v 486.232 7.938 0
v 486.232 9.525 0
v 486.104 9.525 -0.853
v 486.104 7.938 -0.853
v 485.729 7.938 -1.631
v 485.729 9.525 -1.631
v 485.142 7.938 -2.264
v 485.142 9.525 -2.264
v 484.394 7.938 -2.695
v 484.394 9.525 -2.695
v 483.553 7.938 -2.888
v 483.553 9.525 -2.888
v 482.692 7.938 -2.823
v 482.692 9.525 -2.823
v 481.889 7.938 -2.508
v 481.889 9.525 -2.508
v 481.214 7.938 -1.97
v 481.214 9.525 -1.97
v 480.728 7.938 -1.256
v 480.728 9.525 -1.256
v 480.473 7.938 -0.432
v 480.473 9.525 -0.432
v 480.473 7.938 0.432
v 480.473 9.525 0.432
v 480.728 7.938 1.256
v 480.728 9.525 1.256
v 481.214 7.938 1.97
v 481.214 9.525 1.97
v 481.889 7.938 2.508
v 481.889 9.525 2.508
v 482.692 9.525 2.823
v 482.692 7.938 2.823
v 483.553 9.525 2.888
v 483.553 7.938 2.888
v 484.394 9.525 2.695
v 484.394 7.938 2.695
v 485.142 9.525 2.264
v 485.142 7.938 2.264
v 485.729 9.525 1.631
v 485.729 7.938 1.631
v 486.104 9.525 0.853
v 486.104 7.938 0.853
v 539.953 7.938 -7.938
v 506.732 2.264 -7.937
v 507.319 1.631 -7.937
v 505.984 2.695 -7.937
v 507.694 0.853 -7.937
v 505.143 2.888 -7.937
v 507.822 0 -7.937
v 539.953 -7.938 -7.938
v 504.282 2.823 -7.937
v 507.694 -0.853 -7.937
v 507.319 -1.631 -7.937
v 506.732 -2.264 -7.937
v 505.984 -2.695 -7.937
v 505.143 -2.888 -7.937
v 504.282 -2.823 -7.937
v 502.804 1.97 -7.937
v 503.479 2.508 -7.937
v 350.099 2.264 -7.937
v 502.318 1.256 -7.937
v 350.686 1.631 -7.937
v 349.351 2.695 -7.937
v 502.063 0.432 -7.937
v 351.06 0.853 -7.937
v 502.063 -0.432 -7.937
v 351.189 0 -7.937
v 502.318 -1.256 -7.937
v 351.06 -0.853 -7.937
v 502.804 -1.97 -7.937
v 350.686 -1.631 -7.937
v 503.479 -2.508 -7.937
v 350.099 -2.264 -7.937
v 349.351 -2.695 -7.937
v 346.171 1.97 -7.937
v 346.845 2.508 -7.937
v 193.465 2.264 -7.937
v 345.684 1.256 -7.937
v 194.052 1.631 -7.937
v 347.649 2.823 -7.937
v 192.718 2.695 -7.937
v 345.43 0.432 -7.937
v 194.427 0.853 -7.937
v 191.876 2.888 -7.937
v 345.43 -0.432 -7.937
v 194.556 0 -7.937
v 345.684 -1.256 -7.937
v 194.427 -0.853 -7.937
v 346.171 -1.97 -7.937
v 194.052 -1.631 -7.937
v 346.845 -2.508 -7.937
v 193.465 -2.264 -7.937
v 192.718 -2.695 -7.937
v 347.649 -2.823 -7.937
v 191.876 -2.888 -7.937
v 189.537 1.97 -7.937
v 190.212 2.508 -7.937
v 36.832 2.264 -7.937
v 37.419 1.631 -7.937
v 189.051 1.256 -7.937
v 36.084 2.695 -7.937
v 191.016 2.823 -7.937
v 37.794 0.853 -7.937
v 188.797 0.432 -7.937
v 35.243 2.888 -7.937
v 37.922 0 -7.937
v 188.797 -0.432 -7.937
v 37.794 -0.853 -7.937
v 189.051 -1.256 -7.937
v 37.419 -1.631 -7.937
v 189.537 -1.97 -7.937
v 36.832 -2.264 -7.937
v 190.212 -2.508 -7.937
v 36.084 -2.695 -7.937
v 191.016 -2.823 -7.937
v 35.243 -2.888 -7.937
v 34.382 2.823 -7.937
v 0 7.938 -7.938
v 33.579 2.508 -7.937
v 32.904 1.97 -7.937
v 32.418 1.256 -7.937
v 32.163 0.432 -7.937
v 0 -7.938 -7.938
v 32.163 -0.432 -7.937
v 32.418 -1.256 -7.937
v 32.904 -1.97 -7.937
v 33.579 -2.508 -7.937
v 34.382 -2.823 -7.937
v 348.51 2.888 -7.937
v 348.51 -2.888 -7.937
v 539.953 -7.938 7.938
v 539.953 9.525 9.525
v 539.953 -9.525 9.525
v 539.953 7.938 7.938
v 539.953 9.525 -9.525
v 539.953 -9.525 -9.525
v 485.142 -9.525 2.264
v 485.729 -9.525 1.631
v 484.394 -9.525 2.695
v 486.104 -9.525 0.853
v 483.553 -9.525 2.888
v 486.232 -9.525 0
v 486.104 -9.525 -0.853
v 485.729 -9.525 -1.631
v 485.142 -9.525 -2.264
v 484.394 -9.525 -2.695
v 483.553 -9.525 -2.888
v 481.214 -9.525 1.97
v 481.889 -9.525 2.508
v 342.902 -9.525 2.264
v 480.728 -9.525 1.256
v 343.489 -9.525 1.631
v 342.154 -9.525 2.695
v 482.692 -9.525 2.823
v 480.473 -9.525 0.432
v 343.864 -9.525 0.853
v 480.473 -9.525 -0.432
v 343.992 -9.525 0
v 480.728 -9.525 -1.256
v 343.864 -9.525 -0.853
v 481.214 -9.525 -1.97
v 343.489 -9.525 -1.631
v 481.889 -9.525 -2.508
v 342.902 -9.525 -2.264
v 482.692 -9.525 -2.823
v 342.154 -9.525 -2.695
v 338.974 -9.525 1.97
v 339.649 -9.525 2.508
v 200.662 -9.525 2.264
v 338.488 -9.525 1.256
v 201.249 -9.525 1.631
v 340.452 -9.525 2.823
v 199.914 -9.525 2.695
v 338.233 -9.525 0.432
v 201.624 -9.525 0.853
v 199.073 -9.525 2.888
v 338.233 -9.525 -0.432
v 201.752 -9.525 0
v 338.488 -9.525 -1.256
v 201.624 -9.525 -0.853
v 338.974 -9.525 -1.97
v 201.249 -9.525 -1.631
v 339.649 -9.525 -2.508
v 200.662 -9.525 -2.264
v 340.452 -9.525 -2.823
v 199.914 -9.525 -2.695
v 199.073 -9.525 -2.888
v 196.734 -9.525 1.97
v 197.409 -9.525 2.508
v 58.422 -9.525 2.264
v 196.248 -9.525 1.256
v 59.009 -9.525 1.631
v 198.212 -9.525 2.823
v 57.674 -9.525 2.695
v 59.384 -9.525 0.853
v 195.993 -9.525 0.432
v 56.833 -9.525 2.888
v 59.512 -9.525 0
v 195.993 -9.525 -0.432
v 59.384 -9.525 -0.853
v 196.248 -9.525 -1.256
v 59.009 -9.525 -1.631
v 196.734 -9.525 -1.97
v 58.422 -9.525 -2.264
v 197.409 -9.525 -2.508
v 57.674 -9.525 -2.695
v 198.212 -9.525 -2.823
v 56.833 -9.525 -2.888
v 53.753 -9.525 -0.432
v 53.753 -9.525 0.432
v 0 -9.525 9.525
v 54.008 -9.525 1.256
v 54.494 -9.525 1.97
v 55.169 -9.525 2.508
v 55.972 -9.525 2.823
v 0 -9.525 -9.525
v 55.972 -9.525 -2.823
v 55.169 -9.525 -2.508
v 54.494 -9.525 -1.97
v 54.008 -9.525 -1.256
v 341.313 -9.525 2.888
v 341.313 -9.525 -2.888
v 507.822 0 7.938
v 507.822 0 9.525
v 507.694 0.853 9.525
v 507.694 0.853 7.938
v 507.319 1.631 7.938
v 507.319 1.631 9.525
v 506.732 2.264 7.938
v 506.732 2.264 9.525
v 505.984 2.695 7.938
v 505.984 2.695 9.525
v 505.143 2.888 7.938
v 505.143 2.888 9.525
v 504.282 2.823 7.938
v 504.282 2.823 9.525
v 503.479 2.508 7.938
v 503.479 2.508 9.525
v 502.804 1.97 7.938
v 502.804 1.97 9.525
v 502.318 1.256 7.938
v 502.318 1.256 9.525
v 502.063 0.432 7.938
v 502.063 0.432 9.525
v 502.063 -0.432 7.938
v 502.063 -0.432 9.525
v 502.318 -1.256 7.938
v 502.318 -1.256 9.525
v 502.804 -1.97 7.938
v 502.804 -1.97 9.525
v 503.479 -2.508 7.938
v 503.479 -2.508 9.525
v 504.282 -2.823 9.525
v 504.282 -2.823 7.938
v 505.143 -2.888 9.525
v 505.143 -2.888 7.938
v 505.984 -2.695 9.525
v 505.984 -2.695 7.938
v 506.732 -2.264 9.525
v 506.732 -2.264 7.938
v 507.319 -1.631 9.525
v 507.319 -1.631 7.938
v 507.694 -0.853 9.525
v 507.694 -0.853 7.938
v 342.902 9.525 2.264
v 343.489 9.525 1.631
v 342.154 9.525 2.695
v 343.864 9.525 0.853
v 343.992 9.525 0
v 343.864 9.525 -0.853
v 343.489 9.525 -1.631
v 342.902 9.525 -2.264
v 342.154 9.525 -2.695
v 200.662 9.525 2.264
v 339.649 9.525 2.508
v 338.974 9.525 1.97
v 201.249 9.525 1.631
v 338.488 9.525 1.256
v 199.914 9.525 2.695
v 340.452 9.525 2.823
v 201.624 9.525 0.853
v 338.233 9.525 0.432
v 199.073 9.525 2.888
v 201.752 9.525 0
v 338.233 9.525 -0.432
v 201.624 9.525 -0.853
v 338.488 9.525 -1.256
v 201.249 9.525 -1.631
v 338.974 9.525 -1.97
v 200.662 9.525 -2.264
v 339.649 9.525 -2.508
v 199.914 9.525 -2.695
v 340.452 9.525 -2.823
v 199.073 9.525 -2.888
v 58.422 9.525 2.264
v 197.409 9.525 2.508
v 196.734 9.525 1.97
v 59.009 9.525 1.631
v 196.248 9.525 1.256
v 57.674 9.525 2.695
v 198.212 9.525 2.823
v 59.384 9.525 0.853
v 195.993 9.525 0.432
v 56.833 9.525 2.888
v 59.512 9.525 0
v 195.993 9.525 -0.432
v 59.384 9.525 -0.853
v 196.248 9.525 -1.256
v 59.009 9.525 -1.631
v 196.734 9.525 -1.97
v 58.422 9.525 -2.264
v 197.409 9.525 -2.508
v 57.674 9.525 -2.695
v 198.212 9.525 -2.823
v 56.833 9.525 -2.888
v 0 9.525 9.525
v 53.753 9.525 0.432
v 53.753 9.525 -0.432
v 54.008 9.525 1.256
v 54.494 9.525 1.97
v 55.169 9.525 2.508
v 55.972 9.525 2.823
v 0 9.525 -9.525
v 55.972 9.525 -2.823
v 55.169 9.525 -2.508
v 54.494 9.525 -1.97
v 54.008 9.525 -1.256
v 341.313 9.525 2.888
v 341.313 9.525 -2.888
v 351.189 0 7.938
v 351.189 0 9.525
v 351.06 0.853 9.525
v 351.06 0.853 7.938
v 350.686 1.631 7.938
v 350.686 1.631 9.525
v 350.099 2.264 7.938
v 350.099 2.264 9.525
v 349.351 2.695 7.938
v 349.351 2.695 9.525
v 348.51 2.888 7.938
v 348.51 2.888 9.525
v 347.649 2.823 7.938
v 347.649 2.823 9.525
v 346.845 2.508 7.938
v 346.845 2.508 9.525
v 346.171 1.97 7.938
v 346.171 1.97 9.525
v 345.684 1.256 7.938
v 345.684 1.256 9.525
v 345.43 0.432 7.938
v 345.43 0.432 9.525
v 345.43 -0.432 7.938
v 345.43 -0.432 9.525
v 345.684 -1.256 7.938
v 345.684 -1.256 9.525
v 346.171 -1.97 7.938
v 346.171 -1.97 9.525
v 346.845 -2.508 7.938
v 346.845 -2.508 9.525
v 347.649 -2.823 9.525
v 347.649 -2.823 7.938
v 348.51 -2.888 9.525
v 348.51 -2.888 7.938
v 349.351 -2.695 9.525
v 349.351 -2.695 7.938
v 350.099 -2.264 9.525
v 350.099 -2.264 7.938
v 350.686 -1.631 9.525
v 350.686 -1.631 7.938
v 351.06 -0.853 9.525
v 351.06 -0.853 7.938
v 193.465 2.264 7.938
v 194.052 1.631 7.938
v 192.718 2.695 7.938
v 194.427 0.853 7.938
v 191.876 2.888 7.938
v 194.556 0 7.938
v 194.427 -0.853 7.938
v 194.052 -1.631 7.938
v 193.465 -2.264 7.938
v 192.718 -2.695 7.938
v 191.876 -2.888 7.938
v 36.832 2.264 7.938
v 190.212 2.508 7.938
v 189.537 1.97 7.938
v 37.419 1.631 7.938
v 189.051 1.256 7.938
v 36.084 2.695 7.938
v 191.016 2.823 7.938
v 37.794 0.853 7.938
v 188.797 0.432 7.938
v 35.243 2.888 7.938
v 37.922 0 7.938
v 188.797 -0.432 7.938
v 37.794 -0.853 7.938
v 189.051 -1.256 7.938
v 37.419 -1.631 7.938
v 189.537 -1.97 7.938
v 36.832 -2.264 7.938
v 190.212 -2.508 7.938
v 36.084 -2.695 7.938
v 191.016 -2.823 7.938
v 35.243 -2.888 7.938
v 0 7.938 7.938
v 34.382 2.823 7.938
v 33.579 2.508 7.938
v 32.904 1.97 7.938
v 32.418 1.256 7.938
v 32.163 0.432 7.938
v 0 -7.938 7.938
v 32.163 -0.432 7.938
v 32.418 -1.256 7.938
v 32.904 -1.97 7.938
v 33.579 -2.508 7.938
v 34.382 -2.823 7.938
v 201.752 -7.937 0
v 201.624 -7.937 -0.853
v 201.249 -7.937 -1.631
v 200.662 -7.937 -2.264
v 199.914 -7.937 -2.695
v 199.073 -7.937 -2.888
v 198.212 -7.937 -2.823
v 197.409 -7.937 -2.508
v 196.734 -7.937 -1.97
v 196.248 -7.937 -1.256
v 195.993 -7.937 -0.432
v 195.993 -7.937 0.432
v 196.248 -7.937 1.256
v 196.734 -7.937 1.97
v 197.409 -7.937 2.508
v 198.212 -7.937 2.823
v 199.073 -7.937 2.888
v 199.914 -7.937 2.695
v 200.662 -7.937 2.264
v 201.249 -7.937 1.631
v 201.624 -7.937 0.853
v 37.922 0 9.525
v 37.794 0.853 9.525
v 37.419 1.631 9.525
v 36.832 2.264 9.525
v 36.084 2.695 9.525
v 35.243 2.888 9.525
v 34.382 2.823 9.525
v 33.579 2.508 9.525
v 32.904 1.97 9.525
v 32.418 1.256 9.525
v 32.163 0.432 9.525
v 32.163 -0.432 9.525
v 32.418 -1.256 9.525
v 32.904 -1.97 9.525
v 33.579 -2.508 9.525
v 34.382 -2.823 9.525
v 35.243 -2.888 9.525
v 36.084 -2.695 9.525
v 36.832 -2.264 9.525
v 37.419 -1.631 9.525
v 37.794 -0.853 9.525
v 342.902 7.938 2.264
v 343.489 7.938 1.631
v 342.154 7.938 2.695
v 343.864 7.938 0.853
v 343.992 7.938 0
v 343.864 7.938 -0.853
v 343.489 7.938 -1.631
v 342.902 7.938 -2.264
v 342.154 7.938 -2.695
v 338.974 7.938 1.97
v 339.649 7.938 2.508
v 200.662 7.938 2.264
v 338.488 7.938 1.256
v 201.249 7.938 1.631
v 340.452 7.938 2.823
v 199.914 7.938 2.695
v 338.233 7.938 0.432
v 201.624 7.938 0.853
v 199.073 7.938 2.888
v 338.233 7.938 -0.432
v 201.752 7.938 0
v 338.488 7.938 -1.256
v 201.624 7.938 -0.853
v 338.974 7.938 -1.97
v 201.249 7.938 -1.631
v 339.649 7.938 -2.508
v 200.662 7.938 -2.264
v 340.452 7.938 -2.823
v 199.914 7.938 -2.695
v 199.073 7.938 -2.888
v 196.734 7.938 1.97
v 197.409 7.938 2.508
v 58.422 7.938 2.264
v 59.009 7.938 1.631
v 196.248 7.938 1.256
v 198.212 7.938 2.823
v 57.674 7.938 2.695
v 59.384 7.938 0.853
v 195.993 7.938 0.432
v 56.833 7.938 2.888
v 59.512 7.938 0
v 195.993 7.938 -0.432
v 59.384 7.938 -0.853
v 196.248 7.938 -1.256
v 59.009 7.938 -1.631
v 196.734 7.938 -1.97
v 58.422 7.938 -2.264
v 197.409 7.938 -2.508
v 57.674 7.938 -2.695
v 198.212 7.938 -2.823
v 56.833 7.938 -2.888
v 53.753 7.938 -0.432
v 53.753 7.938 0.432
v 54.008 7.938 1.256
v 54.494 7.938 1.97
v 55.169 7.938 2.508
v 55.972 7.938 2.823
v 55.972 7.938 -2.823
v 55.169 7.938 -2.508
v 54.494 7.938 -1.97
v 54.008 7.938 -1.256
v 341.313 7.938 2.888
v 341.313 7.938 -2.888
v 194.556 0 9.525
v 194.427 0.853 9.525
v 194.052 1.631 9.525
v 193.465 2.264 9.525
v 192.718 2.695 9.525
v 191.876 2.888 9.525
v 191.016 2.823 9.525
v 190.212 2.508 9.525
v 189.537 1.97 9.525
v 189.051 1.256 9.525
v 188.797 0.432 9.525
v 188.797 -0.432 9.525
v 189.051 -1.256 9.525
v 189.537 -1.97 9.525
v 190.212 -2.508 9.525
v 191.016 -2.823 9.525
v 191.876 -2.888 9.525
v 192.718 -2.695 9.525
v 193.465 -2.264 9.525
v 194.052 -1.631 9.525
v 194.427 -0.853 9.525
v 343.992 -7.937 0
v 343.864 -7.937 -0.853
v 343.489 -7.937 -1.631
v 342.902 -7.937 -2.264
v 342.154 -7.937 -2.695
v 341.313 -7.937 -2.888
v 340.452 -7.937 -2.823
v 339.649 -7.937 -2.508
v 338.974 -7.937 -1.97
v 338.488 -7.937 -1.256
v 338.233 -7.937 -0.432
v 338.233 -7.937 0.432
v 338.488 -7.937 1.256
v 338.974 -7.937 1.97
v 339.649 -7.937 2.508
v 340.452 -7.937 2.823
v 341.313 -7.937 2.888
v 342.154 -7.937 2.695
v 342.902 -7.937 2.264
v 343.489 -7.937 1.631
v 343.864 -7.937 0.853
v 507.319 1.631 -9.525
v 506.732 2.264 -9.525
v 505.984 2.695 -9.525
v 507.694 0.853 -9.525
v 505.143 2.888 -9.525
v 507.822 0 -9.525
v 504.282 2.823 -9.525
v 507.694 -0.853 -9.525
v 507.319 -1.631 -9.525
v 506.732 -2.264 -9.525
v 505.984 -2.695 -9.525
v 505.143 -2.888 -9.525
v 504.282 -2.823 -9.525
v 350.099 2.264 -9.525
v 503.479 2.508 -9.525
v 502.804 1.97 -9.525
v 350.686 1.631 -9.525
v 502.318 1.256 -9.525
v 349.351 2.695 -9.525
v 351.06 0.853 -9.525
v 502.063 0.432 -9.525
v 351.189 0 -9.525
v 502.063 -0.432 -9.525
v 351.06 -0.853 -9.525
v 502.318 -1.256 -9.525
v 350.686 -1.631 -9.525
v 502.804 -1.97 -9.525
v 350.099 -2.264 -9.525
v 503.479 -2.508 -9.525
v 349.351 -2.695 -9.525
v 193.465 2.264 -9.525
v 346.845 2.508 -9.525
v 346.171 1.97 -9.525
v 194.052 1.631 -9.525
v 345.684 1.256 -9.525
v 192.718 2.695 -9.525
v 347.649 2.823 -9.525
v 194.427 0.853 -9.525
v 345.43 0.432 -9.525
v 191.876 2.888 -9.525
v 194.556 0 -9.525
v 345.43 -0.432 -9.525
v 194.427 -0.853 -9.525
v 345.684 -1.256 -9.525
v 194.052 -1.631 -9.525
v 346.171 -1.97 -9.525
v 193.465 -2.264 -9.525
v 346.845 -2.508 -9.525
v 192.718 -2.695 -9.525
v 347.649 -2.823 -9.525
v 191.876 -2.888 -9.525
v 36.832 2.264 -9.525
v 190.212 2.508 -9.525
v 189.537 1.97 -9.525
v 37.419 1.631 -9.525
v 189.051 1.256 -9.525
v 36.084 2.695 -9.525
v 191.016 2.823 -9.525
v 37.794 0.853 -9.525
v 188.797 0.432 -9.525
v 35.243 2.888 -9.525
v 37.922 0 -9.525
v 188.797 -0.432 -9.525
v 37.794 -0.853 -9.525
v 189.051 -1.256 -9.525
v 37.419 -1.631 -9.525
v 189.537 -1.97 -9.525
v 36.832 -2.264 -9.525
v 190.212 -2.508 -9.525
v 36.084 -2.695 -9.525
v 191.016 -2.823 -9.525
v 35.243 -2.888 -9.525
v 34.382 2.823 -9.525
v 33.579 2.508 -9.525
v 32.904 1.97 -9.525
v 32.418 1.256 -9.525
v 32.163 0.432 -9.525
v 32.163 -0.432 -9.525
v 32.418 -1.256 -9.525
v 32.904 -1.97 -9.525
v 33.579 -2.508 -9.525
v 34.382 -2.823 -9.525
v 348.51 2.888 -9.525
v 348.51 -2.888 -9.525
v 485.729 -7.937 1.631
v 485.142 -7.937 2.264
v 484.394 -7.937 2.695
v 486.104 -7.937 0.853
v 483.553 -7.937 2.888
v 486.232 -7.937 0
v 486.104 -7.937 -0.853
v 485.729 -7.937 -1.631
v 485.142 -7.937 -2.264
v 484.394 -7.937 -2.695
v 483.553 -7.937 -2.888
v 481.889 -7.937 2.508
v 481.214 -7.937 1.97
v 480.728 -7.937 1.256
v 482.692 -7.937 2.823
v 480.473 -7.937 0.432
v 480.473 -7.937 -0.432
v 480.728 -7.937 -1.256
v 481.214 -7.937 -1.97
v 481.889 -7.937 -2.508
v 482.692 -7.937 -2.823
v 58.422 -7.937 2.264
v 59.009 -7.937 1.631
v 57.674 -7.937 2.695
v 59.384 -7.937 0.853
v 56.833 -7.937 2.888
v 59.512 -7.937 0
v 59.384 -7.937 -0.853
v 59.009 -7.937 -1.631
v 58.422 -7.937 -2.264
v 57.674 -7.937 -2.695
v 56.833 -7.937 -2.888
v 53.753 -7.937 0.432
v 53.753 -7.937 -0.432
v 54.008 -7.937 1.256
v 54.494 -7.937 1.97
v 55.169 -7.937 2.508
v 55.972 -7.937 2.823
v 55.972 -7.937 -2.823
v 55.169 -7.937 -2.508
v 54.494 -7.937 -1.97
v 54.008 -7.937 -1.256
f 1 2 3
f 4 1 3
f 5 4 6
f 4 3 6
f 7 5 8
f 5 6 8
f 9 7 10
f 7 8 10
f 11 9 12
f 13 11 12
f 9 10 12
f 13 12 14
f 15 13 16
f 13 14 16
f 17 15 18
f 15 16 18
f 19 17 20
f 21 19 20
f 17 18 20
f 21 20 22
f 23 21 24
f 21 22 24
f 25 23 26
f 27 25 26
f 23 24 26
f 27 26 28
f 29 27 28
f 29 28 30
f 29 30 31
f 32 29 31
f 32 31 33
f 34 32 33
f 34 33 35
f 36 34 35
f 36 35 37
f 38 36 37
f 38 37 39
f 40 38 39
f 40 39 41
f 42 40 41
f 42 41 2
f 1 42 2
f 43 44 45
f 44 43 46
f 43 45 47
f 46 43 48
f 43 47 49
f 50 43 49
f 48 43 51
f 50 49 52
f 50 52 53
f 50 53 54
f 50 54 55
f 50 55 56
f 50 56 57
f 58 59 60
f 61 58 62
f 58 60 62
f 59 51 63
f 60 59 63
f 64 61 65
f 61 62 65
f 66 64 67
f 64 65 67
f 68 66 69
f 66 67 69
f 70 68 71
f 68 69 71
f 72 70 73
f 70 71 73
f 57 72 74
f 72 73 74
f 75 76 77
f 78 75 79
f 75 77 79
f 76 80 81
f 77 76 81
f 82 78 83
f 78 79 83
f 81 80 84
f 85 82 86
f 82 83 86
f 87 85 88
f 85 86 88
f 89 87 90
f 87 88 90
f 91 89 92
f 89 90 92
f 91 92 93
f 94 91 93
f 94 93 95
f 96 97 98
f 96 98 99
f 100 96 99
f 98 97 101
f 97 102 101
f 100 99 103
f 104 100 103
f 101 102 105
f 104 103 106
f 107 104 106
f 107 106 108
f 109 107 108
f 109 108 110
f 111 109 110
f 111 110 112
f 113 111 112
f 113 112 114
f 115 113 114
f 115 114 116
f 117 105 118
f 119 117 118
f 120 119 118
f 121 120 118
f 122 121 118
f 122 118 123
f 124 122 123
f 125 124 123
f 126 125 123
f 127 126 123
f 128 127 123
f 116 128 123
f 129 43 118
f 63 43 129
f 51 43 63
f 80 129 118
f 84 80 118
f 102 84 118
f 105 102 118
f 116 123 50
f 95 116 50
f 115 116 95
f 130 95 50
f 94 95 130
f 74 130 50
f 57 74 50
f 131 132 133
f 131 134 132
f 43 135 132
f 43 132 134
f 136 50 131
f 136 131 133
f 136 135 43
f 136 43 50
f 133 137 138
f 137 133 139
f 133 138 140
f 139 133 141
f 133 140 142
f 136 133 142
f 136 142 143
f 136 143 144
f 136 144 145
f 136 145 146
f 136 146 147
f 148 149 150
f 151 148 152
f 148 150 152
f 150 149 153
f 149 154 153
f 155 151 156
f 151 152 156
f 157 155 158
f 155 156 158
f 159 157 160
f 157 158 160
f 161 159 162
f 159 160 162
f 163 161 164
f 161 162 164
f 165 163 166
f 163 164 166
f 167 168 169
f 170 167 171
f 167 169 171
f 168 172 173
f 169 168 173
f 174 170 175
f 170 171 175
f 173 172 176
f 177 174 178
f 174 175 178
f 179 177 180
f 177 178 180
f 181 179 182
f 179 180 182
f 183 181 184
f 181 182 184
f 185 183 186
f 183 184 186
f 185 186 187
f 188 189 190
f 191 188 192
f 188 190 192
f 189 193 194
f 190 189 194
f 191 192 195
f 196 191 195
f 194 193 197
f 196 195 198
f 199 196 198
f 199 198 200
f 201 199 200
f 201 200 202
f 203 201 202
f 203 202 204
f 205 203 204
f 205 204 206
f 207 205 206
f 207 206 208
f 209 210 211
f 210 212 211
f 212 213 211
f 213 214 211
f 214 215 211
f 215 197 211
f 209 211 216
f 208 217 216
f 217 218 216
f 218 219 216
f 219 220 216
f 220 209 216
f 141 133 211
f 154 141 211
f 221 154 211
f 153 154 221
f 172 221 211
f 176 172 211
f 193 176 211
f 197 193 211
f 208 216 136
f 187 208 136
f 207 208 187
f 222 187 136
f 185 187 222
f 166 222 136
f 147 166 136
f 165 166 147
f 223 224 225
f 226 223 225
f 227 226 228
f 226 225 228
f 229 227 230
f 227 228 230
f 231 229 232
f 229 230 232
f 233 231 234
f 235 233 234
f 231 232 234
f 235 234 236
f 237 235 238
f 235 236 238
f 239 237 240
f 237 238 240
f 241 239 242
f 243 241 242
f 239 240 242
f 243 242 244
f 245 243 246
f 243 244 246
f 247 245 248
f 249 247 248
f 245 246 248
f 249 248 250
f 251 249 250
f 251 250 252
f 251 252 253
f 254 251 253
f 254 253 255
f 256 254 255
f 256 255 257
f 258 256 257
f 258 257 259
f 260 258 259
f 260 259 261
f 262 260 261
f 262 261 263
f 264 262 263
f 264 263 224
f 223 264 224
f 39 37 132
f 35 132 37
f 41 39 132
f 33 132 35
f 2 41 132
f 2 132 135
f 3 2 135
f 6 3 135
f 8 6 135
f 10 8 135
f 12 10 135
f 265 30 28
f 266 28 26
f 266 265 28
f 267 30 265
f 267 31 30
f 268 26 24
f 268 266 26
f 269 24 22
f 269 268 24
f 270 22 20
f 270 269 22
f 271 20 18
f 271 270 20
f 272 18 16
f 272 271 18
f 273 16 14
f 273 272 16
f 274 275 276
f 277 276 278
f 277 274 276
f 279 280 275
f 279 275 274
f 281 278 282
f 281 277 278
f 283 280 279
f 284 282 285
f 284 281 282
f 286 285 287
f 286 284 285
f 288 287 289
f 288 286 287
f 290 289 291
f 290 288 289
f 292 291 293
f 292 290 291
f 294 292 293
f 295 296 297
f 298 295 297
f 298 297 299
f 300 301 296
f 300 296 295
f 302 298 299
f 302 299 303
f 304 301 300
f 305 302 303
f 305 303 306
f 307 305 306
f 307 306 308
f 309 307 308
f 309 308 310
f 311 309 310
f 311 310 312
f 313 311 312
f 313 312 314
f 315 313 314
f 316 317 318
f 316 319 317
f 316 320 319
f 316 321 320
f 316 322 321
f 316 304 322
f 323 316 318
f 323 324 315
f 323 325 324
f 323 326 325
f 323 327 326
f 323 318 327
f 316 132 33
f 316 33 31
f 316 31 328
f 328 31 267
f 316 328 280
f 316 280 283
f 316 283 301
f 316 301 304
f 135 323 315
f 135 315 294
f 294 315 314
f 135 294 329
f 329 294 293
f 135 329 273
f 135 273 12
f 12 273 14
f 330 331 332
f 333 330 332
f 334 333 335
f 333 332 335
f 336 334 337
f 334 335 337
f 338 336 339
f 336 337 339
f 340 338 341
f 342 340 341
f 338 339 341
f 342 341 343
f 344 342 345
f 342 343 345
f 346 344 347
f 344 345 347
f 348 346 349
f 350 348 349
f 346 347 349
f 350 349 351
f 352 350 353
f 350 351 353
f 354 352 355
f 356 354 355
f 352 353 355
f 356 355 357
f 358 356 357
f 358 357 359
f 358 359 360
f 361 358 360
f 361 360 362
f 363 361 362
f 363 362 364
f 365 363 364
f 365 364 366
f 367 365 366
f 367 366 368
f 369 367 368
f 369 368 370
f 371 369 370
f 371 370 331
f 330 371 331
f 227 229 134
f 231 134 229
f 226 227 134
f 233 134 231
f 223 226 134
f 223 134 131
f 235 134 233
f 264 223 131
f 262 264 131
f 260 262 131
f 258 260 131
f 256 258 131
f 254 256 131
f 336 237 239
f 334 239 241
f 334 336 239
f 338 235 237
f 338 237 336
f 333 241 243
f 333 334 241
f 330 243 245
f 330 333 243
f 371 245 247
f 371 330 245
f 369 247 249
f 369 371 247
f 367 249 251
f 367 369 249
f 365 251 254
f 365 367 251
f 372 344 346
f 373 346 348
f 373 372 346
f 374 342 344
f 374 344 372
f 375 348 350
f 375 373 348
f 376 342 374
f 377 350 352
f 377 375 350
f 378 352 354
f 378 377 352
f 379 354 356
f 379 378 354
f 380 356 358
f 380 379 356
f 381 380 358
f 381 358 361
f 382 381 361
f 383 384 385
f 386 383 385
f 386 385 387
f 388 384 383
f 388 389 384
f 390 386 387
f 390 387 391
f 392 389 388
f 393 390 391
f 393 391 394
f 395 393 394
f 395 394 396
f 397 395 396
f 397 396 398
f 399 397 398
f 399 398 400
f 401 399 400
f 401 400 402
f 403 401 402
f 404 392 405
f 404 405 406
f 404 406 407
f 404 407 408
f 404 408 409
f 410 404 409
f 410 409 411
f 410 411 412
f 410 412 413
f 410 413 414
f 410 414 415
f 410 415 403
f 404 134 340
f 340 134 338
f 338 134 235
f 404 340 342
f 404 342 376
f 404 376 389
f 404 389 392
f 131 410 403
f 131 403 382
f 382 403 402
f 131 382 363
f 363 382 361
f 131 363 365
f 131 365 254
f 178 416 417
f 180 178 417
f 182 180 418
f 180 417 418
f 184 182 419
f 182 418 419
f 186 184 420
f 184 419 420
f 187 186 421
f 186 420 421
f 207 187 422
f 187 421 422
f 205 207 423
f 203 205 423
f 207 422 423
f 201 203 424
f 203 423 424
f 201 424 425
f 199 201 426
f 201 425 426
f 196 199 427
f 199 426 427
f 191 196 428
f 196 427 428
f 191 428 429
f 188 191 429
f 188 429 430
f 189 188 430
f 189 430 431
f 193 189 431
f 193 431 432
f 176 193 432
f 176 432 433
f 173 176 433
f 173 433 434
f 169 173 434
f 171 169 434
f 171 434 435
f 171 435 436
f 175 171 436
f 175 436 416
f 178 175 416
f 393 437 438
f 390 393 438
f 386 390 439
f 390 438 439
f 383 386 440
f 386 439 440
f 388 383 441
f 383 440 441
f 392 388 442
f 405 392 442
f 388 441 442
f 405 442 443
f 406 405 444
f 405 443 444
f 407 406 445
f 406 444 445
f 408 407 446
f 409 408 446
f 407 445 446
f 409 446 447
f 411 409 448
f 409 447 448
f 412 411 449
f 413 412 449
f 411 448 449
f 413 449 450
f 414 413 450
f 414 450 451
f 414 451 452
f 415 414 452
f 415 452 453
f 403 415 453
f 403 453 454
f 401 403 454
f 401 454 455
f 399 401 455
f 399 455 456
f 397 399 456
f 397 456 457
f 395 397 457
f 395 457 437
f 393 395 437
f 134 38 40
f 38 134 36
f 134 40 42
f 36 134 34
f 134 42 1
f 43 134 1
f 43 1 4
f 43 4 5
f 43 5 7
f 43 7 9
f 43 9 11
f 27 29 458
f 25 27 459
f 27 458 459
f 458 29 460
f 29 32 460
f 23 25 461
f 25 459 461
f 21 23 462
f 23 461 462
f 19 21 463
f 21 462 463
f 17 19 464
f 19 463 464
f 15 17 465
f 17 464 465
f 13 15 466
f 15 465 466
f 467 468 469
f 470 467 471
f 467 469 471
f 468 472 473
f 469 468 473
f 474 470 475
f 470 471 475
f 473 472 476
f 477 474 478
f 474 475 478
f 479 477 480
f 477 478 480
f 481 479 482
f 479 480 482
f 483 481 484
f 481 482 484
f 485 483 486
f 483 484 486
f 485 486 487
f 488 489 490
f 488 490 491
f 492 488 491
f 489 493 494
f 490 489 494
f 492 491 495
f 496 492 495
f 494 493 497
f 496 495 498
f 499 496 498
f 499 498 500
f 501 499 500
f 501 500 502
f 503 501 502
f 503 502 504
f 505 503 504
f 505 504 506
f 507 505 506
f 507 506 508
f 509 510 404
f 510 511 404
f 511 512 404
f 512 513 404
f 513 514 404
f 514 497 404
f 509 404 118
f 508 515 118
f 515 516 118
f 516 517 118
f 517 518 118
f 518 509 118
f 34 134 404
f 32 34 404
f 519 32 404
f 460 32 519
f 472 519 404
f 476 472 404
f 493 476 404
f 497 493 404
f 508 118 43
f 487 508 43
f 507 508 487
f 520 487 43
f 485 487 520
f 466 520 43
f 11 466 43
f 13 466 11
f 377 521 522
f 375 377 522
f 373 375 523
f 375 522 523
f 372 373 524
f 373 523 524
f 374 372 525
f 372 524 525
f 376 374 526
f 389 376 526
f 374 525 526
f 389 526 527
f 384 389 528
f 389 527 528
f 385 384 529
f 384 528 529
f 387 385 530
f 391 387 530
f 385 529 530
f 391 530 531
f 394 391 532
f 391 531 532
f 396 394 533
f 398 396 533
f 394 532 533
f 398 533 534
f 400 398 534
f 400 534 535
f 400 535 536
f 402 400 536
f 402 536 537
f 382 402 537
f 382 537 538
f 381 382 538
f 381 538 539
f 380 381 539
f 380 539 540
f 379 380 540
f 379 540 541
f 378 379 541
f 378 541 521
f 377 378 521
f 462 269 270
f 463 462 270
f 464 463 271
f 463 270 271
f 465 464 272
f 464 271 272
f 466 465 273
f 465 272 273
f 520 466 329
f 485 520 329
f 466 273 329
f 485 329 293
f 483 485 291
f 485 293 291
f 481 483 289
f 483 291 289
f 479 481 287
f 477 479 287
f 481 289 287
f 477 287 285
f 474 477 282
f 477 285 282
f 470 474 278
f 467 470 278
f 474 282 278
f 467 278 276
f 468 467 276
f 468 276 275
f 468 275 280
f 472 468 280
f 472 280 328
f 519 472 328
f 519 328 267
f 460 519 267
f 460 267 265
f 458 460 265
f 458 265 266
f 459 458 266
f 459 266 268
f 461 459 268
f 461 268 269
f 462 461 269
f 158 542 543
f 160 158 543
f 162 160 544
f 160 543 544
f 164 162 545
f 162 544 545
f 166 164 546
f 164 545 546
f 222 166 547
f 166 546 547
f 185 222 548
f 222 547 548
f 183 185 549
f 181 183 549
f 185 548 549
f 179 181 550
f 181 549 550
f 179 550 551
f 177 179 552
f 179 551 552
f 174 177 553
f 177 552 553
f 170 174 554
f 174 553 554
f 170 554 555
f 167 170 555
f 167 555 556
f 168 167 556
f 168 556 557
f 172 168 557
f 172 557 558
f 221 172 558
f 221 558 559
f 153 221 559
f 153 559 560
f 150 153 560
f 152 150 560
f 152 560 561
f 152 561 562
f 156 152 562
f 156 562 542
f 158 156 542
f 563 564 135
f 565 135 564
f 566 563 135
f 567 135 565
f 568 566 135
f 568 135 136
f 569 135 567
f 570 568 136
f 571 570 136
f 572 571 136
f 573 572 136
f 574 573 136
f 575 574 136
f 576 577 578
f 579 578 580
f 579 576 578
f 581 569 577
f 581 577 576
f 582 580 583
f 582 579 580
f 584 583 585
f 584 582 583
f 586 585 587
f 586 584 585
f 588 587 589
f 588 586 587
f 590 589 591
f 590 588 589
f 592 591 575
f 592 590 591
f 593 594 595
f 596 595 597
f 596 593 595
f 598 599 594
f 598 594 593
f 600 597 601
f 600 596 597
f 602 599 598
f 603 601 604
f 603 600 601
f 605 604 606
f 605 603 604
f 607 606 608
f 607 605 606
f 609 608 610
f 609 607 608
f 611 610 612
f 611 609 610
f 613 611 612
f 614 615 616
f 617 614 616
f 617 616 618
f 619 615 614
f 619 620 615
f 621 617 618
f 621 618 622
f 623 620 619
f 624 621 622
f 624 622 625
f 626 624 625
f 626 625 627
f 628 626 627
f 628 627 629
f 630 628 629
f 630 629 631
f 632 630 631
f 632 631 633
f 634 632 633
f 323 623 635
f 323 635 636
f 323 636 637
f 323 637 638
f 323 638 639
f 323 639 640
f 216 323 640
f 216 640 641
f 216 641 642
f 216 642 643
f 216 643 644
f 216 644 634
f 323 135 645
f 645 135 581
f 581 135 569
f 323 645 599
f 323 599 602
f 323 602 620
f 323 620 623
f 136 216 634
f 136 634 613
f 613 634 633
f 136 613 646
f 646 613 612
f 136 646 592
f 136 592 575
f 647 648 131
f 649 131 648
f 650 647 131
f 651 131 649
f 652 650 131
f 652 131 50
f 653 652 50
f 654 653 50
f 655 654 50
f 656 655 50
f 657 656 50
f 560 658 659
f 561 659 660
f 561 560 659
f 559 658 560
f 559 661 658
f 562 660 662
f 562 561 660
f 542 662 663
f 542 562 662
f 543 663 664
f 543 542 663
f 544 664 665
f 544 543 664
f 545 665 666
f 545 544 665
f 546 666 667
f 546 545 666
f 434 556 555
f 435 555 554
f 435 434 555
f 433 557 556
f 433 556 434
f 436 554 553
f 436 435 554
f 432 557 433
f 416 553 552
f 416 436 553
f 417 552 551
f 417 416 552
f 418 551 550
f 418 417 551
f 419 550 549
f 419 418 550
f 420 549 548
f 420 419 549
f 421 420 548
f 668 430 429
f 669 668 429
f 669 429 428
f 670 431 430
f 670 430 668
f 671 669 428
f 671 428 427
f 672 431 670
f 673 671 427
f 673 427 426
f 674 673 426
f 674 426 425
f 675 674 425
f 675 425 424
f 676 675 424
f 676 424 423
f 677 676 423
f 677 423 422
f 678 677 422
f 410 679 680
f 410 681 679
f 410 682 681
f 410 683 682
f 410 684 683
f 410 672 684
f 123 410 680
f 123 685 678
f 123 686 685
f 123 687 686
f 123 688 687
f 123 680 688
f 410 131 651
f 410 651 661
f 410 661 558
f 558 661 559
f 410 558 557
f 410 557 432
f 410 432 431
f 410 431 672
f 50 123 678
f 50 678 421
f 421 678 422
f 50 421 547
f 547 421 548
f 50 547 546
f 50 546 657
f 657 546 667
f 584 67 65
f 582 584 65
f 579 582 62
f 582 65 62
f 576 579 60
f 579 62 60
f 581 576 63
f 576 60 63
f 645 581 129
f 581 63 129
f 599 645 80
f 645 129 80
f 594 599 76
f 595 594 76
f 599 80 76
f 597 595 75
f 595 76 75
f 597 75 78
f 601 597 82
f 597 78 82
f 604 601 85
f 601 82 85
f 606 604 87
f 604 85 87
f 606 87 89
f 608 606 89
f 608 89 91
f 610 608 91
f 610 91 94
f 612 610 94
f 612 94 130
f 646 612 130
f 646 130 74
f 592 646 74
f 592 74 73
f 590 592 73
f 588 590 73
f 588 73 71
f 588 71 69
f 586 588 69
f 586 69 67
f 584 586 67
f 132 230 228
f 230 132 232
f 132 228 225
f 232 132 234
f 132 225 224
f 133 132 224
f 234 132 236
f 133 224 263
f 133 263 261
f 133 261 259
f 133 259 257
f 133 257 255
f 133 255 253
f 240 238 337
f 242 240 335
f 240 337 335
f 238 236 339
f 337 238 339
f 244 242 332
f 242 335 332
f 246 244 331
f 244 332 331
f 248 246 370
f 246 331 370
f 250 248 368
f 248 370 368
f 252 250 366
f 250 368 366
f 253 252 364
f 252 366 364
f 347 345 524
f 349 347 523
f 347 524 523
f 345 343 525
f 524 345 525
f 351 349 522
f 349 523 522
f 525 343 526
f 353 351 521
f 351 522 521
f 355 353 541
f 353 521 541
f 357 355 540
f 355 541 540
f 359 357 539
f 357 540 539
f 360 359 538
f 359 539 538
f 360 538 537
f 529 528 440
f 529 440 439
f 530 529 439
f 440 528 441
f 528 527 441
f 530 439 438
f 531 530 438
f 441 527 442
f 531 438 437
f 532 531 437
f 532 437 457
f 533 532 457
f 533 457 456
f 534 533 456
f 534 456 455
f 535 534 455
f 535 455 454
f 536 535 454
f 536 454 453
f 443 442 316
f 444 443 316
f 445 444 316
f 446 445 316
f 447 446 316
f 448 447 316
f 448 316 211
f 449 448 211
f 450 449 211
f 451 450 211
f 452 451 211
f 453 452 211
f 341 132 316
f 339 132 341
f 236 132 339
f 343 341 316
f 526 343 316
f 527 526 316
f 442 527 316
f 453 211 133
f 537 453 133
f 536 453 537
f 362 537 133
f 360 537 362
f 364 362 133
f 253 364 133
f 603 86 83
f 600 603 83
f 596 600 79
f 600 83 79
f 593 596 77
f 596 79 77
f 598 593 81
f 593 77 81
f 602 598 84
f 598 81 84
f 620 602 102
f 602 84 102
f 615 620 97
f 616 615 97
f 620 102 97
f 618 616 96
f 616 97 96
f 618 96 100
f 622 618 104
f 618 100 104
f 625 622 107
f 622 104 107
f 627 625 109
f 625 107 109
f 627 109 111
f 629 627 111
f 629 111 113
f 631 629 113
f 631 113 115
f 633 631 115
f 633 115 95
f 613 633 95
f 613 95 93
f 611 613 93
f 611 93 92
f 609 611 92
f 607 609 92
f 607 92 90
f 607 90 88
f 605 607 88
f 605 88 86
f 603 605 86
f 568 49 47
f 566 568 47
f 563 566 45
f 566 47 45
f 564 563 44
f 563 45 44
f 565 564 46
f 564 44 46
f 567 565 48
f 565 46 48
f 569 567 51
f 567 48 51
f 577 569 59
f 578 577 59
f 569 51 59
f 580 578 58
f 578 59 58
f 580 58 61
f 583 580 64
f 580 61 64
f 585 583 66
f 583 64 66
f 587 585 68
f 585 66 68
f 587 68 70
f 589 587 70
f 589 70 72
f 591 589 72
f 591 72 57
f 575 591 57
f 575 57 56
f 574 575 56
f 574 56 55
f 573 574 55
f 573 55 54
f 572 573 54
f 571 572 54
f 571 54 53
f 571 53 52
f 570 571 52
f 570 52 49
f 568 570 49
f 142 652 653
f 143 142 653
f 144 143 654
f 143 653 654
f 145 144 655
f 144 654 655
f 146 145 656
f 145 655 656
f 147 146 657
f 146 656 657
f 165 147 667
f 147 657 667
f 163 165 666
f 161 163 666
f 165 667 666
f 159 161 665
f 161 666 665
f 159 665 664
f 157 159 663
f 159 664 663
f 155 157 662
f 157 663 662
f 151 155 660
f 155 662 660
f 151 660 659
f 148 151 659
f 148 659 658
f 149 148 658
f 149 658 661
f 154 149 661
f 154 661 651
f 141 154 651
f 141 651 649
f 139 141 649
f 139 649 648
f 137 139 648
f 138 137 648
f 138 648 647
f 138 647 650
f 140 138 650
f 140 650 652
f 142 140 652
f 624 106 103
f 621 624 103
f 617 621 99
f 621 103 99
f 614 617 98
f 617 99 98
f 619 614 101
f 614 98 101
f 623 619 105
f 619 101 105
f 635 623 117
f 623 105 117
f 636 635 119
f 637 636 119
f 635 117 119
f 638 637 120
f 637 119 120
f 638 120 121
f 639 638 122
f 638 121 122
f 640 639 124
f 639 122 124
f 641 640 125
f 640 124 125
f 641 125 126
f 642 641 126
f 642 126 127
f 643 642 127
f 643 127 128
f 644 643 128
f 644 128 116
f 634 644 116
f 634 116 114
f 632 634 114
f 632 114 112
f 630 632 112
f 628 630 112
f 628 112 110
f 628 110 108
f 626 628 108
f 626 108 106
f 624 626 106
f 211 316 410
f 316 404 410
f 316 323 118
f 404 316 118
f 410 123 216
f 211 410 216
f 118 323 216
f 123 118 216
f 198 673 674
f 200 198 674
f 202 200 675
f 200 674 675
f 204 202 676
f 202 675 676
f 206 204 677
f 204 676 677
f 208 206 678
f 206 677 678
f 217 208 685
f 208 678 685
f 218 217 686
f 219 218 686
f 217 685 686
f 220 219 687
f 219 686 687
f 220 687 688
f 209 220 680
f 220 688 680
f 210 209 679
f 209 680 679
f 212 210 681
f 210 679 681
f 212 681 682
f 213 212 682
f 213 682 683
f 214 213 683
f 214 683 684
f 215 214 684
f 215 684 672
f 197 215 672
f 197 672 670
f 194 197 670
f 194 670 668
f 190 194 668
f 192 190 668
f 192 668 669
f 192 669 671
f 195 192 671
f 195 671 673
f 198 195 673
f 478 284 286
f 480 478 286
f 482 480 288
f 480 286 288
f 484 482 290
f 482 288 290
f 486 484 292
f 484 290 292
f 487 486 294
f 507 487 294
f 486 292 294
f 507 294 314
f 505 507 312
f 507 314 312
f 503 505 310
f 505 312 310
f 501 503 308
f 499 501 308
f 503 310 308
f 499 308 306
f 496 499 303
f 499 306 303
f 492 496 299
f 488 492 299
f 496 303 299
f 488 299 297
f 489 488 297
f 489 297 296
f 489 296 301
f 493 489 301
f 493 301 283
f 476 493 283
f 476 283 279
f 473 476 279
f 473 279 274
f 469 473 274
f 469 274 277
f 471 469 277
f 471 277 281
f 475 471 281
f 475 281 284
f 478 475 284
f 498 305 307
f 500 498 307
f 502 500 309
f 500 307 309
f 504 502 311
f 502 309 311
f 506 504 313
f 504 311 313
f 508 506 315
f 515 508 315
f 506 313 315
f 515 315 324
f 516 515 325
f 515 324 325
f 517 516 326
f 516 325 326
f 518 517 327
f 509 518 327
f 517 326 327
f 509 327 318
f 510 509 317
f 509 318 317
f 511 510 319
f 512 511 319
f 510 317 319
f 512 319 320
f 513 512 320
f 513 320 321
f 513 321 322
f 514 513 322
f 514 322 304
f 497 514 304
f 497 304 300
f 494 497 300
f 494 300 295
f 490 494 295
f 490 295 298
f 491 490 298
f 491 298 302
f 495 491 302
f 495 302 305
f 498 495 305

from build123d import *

# Parameters (mm, degrees)
SKETCH1_W               = 19.05
SKETCH1_H               = 19.05
SKETCH1_W_2             = 15.875
SKETCH1_H_2             = 15.875
TUBE_DEPTH              = 539.9532
SKETCH2_R               = 2.8956
REARWALLHOLES_DEPTH     = 20.05
LPATTERN1_COUNT         = 4
LPATTERN1_PITCH         = 156.633333333
SKETCH3_R               = 2.8956
REARTOPHOLEMASTER_DEPTH = 20.05
LPATTERN2_COUNT         = 4
LPATTERN2_PITCH         = 142.24


with BuildPart() as part:
    # Sketch1 → Tube (new body)
    with BuildSketch(Plane(origin=(0, 0, 0), x_dir=(0, -1, 0), z_dir=(1, 0, 0))):
        Rectangle(SKETCH1_W, SKETCH1_H)
        Rectangle(SKETCH1_W_2, SKETCH1_H_2, mode=Mode.SUBTRACT)
    extrude(amount=TUBE_DEPTH)

    # Sketch2 → RearWallHoles (cut, through all)
    with BuildSketch(Plane.XY.offset(9.525)):
        with Locations((504.9266, 0)):
            Circle(SKETCH2_R)
    rearwallholes = extrude(amount=-REARWALLHOLES_DEPTH, mode=Mode.SUBTRACT)

    # LPattern1: RearWallHoles ×4
    with Locations(*[(-i * LPATTERN1_PITCH, 0, 0) for i in range(1, LPATTERN1_COUNT)]):
        add(rearwallholes, mode=Mode.SUBTRACT)

    # Sketch3 → RearTopHoleMaster (cut, through all)
    with BuildSketch(Plane(origin=(0, 9.525, 0), x_dir=(1, 0, 0), z_dir=(0, 1, 0))):
        with Locations((56.6166, 0)):
            Circle(SKETCH3_R)
    reartopholemaster = extrude(amount=-REARTOPHOLEMASTER_DEPTH, mode=Mode.SUBTRACT)

    # LPattern2: RearTopHoleMaster ×4
    with Locations(*[(i * LPATTERN2_PITCH, 0, 0) for i in range(1, LPATTERN2_COUNT)]):
        add(reartopholemaster, mode=Mode.SUBTRACT)


solid = part.part
